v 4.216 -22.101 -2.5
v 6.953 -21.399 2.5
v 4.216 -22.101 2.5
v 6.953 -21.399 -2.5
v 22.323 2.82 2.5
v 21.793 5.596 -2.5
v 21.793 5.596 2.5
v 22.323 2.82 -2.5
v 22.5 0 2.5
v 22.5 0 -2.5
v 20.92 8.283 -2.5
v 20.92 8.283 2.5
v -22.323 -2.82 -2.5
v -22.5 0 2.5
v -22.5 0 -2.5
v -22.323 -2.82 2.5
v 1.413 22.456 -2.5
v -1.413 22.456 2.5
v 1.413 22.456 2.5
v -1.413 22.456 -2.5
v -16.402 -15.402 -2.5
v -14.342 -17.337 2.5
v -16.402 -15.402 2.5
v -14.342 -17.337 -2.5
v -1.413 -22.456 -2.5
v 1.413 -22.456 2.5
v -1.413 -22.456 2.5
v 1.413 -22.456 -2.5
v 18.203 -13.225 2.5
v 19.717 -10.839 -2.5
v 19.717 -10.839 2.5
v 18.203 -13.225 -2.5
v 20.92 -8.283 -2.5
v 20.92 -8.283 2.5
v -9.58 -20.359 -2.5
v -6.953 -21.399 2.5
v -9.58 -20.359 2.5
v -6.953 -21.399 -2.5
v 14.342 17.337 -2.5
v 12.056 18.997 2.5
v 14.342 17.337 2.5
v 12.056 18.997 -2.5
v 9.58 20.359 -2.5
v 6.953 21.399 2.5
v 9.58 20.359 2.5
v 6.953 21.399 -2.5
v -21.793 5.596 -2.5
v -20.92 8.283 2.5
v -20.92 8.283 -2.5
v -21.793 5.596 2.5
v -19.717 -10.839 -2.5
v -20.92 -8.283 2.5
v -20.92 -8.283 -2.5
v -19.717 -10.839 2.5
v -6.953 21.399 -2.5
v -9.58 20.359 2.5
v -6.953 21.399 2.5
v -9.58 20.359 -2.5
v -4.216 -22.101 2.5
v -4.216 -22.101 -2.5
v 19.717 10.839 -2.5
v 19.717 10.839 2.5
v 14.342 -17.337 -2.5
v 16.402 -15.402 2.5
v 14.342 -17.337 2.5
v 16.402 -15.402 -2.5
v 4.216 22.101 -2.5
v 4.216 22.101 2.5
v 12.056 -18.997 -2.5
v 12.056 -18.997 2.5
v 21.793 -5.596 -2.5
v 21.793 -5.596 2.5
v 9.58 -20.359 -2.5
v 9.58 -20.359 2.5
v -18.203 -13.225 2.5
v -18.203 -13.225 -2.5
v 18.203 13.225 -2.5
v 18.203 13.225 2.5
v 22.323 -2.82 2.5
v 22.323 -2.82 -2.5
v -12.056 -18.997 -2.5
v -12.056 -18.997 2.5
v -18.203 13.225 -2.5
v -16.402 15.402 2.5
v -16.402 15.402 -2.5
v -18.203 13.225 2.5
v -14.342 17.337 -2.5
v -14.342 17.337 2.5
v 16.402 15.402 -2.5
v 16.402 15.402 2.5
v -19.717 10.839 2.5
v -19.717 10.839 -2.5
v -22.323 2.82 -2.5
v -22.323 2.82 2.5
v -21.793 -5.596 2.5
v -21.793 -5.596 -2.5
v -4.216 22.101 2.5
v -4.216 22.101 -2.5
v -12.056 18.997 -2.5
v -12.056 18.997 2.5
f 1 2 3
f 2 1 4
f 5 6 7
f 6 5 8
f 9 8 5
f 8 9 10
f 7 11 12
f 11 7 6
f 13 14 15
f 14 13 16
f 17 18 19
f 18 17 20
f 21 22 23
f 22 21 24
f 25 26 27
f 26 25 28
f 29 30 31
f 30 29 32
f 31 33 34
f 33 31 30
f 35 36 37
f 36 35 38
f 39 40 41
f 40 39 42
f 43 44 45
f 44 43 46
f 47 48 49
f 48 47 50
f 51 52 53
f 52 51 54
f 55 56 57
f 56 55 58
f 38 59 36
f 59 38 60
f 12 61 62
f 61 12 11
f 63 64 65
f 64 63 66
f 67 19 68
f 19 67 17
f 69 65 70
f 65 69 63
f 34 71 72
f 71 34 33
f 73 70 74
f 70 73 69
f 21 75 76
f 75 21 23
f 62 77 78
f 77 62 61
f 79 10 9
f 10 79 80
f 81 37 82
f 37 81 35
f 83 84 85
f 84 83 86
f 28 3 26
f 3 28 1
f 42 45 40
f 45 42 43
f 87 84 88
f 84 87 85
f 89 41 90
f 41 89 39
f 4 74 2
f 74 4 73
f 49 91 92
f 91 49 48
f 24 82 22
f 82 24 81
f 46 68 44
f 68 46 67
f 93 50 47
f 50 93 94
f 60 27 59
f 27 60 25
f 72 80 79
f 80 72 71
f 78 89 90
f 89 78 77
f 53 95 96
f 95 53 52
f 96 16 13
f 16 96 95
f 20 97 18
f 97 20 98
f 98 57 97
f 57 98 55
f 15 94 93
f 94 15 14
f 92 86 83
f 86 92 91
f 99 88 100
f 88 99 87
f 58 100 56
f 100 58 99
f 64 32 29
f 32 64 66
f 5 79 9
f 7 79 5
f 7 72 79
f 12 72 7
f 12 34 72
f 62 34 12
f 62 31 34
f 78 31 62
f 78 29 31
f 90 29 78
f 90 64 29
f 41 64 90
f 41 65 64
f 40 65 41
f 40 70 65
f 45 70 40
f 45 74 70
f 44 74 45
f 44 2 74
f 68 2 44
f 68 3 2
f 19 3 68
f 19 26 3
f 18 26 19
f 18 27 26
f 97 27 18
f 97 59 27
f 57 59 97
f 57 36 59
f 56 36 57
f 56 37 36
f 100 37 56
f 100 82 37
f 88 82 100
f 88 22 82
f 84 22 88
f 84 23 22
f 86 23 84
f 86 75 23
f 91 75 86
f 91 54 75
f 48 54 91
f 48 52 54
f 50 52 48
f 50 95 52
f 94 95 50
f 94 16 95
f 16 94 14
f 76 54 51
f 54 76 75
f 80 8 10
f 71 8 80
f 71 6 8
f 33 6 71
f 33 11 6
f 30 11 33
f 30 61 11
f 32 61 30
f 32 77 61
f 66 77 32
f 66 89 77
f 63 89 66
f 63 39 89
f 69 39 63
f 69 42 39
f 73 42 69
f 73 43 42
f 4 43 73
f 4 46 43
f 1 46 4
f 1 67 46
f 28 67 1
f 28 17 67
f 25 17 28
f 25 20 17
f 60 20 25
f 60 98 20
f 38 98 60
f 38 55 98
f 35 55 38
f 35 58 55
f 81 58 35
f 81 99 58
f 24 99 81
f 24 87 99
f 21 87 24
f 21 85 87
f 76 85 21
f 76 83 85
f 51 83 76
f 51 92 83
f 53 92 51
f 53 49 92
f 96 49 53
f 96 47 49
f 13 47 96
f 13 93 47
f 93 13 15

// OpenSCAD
$fn = 50;


difference() {
	union() {
		translate(v = [0, 0, -2.5000000000]) {
			cylinder(h = 5, r = 22.5000000000);
		}
	}
	union();
}
